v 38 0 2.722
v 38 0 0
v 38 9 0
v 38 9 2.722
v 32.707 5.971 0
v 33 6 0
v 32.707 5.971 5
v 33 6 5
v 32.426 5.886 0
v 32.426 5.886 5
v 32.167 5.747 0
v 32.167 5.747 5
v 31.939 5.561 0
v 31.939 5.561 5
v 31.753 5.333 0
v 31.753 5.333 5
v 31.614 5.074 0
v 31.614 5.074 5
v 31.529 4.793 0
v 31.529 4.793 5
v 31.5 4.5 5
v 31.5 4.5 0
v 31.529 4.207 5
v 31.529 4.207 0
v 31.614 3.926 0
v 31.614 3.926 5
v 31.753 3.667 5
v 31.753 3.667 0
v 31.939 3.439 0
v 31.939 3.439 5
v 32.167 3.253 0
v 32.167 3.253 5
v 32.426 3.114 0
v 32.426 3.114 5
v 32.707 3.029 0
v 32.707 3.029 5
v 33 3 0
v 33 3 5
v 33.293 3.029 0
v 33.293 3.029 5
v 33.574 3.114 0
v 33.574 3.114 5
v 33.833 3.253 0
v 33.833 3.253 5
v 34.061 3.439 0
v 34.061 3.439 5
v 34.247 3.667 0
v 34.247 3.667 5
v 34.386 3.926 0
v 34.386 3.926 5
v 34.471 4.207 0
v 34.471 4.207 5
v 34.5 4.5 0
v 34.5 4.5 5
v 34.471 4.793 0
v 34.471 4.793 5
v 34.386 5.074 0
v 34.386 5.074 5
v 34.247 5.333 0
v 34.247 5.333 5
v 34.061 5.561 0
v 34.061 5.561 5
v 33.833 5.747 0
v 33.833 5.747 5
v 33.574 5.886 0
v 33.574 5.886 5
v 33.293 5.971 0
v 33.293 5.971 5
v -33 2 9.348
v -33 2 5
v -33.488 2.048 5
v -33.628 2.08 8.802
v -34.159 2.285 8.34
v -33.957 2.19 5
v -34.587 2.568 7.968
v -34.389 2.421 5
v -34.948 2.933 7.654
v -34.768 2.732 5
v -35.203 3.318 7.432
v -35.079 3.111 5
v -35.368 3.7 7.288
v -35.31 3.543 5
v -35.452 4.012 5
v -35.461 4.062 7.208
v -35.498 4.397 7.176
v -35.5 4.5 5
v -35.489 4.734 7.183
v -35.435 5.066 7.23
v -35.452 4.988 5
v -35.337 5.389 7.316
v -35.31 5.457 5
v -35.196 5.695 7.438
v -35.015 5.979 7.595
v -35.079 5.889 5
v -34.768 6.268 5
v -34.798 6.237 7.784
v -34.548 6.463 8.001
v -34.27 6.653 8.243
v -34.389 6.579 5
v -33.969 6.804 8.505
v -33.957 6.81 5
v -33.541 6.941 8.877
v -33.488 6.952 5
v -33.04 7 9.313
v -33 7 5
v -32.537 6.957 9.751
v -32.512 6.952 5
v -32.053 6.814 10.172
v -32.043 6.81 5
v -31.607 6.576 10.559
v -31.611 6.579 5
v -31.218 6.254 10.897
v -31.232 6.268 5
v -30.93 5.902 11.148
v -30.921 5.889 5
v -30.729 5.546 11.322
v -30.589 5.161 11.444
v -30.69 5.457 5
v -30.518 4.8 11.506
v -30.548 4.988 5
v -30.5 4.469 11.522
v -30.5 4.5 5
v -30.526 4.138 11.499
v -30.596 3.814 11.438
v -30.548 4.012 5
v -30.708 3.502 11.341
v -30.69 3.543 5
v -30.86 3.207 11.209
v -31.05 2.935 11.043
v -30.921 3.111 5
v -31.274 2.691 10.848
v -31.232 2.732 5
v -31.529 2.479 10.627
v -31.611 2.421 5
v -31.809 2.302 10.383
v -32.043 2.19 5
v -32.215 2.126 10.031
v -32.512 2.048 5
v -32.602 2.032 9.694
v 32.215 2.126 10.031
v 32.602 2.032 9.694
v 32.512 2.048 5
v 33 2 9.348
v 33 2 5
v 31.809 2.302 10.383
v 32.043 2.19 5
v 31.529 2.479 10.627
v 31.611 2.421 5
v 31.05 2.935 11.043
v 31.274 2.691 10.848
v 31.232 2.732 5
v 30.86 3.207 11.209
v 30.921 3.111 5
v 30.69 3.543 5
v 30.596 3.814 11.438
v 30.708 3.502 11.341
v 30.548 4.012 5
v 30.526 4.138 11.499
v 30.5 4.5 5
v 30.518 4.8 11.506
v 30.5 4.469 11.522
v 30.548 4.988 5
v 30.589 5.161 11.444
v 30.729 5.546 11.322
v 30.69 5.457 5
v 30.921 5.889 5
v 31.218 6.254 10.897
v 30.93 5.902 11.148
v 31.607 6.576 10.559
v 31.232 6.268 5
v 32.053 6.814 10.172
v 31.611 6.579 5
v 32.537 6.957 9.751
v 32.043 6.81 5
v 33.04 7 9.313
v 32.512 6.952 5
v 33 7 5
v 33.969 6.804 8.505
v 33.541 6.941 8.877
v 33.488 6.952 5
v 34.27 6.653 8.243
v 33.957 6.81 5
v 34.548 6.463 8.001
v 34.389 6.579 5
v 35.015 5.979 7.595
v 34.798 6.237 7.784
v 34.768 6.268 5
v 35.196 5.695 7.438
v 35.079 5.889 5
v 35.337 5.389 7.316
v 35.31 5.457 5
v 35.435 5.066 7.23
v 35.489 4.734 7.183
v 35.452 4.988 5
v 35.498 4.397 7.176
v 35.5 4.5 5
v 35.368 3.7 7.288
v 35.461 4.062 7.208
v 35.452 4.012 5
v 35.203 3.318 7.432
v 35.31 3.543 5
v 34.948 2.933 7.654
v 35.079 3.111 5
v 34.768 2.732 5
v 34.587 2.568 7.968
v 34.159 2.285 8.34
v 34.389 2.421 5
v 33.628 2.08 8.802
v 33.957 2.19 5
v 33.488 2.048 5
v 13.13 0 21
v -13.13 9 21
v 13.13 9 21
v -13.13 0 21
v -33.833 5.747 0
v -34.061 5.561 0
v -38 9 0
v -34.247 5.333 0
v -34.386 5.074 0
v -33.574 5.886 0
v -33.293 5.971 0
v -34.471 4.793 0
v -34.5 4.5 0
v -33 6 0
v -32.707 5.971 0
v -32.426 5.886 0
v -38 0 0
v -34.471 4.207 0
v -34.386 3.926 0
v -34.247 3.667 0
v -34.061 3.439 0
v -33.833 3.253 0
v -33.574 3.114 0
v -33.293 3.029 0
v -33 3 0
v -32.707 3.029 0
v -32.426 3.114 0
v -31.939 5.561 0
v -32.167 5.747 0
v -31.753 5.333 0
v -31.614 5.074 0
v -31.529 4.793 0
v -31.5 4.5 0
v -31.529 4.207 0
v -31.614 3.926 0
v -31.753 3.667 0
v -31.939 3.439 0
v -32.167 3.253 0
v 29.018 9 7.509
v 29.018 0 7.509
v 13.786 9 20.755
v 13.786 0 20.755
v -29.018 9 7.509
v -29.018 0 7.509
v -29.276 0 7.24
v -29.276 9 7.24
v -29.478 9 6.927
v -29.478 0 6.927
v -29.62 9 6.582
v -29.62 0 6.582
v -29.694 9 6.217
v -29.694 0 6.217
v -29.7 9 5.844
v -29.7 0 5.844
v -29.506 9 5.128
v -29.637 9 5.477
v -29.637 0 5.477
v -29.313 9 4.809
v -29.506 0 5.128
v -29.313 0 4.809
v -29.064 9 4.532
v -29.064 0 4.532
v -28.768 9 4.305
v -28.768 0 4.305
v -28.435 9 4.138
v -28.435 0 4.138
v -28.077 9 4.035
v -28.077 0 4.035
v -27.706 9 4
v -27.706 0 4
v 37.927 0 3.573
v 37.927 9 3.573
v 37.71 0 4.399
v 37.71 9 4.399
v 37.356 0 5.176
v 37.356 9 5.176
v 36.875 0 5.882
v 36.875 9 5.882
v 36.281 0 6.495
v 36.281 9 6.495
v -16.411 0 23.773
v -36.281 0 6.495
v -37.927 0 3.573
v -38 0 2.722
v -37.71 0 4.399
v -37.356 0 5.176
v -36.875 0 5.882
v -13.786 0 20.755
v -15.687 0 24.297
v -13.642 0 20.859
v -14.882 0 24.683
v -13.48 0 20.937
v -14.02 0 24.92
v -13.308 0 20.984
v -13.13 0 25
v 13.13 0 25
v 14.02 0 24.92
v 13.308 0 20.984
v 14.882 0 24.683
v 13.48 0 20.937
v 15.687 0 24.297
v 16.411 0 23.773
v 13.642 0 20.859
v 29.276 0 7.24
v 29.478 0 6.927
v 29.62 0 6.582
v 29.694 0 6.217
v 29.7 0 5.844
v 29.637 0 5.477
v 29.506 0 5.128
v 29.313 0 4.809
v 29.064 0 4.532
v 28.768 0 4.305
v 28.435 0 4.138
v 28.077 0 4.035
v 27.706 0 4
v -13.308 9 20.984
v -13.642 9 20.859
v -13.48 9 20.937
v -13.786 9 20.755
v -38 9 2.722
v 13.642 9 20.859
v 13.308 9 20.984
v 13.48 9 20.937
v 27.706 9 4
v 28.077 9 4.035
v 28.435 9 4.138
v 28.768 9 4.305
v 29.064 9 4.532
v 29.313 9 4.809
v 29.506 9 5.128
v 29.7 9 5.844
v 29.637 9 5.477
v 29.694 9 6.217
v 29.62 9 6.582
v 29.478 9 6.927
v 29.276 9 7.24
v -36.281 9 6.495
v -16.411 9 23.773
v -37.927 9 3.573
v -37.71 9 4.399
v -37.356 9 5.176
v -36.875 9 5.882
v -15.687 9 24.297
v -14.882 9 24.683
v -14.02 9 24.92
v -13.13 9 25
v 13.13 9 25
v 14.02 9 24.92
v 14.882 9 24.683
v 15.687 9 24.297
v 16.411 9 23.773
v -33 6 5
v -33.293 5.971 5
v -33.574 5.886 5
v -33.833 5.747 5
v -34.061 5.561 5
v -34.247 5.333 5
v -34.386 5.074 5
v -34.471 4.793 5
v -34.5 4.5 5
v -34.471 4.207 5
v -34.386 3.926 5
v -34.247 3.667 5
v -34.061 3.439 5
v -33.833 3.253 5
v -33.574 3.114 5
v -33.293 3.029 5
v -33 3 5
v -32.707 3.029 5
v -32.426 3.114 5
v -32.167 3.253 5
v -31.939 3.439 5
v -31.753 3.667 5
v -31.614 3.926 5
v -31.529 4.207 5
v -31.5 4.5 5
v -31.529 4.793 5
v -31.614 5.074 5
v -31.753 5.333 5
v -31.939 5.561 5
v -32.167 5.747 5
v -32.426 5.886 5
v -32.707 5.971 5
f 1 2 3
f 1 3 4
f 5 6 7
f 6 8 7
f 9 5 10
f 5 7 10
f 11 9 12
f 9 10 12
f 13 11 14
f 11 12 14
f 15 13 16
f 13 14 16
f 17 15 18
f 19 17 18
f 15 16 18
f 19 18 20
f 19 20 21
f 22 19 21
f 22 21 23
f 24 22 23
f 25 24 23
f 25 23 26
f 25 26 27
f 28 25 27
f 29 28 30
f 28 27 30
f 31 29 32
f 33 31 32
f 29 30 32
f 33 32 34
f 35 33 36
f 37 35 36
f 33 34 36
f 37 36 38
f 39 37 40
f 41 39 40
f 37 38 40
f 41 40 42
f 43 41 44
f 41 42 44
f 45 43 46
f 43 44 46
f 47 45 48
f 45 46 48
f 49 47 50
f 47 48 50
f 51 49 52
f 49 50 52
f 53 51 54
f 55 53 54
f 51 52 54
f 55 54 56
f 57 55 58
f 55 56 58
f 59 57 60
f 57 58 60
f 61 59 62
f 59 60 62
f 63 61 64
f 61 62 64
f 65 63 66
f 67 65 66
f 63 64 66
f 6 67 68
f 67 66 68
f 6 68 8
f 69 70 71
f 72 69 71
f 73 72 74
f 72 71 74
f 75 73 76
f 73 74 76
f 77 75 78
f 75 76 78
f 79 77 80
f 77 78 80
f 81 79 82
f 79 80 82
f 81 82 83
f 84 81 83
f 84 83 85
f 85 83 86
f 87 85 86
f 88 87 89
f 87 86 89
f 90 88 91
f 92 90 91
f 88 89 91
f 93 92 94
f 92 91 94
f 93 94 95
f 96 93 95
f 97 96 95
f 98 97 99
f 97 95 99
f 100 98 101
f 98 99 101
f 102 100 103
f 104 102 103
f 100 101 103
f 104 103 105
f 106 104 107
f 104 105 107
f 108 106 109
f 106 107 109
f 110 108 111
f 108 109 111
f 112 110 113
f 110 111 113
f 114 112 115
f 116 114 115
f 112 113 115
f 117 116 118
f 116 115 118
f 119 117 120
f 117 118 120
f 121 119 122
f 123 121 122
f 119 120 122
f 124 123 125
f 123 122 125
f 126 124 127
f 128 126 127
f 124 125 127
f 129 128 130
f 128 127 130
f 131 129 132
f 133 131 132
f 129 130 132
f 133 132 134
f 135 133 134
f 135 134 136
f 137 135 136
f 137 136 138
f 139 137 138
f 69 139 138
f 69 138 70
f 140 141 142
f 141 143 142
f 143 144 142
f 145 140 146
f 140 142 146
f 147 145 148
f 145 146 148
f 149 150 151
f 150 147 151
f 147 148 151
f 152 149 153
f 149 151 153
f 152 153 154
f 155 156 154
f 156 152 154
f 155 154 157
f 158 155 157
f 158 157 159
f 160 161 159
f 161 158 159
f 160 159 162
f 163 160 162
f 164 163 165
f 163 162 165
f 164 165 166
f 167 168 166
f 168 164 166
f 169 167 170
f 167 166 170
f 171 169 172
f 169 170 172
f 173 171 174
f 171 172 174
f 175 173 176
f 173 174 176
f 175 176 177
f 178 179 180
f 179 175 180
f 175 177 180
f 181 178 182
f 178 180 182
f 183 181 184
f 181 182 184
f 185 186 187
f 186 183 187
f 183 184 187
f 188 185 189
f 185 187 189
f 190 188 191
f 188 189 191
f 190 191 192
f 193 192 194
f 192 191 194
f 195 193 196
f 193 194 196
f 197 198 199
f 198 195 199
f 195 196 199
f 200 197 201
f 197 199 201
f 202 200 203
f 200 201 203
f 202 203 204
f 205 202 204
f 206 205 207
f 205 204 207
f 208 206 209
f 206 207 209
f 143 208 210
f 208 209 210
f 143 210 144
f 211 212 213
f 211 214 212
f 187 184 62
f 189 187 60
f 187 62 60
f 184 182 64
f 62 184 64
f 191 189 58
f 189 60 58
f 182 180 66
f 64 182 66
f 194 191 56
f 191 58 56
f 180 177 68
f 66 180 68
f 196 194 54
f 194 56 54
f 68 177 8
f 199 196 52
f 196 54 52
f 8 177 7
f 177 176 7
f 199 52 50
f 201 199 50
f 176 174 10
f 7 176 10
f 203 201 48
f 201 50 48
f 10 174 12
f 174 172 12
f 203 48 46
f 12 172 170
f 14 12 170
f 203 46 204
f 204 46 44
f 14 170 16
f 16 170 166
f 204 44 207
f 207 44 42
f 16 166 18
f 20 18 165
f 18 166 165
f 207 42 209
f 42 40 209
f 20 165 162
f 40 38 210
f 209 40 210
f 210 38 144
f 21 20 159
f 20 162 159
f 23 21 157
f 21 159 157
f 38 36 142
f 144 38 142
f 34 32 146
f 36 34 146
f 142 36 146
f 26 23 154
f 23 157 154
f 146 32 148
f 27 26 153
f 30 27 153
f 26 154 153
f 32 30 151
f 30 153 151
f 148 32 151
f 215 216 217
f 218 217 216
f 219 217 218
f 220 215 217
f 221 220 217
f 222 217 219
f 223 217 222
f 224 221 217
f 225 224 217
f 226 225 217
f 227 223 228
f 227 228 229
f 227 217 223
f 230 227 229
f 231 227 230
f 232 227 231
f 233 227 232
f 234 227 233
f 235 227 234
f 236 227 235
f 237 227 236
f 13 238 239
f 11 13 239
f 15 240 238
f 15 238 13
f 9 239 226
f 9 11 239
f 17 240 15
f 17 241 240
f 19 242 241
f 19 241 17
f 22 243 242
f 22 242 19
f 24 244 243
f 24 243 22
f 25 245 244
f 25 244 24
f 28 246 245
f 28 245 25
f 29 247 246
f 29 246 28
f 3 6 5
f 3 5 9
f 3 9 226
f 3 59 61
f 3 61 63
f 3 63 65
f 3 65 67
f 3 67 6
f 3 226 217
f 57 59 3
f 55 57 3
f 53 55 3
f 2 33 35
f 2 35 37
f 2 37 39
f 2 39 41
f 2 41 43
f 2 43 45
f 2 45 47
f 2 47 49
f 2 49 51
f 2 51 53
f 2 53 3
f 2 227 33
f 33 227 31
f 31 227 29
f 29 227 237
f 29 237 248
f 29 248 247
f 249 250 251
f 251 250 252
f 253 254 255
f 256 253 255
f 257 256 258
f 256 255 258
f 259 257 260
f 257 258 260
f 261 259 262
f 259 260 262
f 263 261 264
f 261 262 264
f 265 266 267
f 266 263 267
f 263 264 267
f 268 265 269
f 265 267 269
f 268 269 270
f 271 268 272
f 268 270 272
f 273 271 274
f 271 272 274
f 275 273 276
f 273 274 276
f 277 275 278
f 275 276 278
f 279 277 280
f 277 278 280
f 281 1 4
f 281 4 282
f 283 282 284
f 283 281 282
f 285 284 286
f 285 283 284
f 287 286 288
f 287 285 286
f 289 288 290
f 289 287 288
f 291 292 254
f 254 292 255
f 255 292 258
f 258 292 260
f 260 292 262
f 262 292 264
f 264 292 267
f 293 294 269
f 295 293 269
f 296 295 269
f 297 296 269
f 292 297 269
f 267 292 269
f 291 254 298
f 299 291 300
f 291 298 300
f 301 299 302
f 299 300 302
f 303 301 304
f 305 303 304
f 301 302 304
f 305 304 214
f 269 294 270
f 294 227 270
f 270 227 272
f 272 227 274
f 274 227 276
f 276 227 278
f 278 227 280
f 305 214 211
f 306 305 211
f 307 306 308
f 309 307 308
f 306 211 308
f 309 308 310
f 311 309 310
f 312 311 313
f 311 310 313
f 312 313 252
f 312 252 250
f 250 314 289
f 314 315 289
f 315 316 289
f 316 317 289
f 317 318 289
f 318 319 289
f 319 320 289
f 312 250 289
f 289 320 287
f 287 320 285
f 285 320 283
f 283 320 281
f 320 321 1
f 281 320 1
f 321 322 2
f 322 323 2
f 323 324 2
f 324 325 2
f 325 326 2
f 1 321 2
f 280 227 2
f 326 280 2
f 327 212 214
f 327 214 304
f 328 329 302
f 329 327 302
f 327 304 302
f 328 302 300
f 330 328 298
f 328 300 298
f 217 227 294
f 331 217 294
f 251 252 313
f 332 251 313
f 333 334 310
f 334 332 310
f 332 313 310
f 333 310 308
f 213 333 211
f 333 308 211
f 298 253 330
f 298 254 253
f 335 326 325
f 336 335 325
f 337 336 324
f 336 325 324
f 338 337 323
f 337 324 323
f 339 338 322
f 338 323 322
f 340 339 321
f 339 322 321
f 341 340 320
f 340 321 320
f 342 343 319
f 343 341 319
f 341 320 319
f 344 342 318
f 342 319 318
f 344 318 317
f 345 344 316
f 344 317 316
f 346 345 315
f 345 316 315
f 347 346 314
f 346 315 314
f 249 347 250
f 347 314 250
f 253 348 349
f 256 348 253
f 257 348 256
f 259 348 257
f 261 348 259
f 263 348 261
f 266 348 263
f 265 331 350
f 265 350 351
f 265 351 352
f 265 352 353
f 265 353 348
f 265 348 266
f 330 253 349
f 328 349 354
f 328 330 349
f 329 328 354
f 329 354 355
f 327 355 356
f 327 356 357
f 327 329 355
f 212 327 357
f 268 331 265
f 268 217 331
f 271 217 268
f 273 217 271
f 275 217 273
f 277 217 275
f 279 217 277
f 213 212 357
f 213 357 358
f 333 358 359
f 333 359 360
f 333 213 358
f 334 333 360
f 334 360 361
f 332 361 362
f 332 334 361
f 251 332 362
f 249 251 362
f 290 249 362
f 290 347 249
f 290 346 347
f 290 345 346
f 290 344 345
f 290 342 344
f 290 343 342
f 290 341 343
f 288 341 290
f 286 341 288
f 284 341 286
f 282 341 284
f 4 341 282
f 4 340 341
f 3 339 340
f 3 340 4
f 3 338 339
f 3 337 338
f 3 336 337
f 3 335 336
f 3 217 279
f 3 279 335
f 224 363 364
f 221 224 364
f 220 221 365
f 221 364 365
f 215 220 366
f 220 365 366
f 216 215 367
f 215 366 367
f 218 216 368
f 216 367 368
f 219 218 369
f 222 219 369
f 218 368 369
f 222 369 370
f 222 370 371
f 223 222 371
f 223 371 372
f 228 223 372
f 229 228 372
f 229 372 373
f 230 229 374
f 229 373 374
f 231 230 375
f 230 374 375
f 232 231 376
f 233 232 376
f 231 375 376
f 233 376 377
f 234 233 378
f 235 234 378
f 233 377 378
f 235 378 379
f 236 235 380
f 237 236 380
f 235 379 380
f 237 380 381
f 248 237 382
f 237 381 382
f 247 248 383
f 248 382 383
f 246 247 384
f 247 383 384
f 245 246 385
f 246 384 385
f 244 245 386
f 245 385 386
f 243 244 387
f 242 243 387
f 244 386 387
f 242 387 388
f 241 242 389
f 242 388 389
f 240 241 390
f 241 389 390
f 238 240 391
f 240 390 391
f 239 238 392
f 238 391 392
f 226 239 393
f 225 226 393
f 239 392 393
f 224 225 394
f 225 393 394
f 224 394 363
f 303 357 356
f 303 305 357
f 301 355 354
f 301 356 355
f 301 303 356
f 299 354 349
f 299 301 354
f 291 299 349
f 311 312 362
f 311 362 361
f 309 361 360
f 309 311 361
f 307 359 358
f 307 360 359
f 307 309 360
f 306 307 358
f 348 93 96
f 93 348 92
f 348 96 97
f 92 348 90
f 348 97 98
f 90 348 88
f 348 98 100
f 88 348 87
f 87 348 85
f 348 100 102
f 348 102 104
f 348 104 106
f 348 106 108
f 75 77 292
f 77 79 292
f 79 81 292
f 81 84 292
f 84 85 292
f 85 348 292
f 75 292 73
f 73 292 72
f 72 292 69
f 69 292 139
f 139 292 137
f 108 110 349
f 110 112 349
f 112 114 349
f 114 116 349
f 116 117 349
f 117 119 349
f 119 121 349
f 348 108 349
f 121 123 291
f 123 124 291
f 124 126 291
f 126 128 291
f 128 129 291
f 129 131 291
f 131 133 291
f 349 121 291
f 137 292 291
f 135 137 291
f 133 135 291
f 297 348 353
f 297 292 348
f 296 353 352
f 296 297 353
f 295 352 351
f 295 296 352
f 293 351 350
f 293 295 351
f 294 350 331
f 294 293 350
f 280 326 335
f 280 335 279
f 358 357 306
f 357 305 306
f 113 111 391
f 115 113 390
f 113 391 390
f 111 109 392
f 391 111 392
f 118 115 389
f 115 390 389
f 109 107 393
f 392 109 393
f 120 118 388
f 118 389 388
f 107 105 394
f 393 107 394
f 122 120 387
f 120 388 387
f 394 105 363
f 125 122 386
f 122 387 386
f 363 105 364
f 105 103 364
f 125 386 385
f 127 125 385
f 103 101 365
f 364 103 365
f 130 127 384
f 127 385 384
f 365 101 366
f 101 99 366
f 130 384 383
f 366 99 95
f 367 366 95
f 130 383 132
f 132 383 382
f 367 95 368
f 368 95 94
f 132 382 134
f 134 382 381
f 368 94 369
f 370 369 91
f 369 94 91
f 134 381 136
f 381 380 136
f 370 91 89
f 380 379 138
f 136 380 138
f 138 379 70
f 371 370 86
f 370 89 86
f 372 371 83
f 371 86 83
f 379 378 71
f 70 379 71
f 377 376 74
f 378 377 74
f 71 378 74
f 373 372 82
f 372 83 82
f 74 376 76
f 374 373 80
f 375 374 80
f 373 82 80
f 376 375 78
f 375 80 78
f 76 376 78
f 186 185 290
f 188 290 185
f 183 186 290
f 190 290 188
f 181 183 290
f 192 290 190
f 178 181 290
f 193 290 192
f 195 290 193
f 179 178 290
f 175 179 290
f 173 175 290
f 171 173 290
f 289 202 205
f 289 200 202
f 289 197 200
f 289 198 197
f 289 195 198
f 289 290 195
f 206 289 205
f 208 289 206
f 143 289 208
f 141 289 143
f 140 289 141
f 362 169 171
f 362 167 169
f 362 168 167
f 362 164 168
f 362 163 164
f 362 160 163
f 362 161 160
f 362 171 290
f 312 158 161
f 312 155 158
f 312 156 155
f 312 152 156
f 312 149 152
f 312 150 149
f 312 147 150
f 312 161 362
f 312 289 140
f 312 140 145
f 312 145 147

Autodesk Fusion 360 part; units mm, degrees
sketch "Sketch1" plane through (0, 0, 0) normal (0, 1, 0) x (1, 0, 0)
  line L0 (0, 0) -> (-33, 0)
  line L1 (0, 0) -> (33, 0)
  line L2 (-33, 0) -> (-38, 0)
  line L3 (33, 0) -> (38, 0)
  line L4 (-38, 0) -> (-38, -2.7218)
  line L5 (-36.2809, -6.4949) -> (-16.411, -23.773)
  line L6 (-13.1301, -25) -> (13.1301, -25)
  line L7 (38, 0) -> (38, -2.7218)
  line L8 (36.2809, -6.4949) -> (16.411, -23.773)
  arc A0 (-38, -2.7218) -> (-36.2809, -6.4949) centre (-33, -2.7218) ccw
  arc A1 (36.2809, -6.4949) -> (38, -2.7218) centre (33, -2.7218) ccw
  arc A2 (13.1301, -25) -> (16.411, -23.773) centre (13.1301, -20) ccw
  arc A3 (-16.411, -23.773) -> (-13.1301, -25) centre (-13.1301, -20) ccw
  line L9 (0, -4) -> (27.7062, -4)
  line L10 (33, -4) -> (33.0541, -4)
  line L11 (29.0185, -7.5092) -> (13.7863, -20.7546)
  arc A4 (13.1301, -21) -> (13.7863, -20.7546) centre (13.1301, -20) ccw
  line L12 (-13.1301, -21) -> (13.1301, -21)
  arc A5 (-13.7863, -20.7546) -> (-13.1301, -21) centre (-13.1301, -20) ccw
  line L13 (-29.0185, -7.5092) -> (-13.7863, -20.7546)
  line L14 (-33, -4) -> (-33.0541, -4)
  line L15 (0, -4) -> (-27.7062, -4)
  arc A6 (-27.7062, -4) -> (-29.0185, -7.5092) centre (-27.7062, -6) ccw
  arc A7 (29.0185, -7.5092) -> (27.7062, -4) centre (27.7062, -6) ccw
  dimension "d2" = 5
  dimension "d3" = 2
  dimension "d4" = 2
extrude "Extrude1" add sketch "Sketch1" along normal blind 9
sketch "Sketch2" plane through (0, 0, 0) normal (0, 0, -1) x (-1, 0, 0)
  line L0 (-38, 0) -> (38, 0)
  line L1 (38, 0) -> (38, 9)
  line L2 (38, 9) -> (-38, 9)
  line L3 (-38, 9) -> (-38, 0)
  line L4 (0, 0) -> (0, 9)
  line L5 (0, 4.5) -> (-33, 4.5)
  line L6 (0, 4.5) -> (33, 4.5)
  dimension "d7" = 33
  dimension "d8" = 33
hole "Hole1" at (33, 4.5, 0) at (-33, 4.5, 0) direction (0, 0, 1) diameter 3 depth 122 tip angle 180
sketch "Sketch3" plane through (0, 0, 25) normal (0, 0, 1) x (1, 0, 0)
  line L0 (-13.1301, 0) -> (13.1301, 0)
  line L1 (13.1301, 0) -> (13.1301, 9)
  line L2 (13.1301, 9) -> (-13.1301, 9)
  line L3 (-13.1301, 9) -> (-13.1301, 0)
  line L4 (0, 0) -> (0, 9)
  line L5 (0, 4.5) -> (-33, 4.5)
  line L6 (0, 4.5) -> (33, 4.5)
  dimension "d12" = 33
  dimension "d13" = 33
hole "Hole2" at (33, 4.5, 25) at (-33, 4.5, 25) direction (0, 0, -1) diameter 5 depth 20 tip angle 180
